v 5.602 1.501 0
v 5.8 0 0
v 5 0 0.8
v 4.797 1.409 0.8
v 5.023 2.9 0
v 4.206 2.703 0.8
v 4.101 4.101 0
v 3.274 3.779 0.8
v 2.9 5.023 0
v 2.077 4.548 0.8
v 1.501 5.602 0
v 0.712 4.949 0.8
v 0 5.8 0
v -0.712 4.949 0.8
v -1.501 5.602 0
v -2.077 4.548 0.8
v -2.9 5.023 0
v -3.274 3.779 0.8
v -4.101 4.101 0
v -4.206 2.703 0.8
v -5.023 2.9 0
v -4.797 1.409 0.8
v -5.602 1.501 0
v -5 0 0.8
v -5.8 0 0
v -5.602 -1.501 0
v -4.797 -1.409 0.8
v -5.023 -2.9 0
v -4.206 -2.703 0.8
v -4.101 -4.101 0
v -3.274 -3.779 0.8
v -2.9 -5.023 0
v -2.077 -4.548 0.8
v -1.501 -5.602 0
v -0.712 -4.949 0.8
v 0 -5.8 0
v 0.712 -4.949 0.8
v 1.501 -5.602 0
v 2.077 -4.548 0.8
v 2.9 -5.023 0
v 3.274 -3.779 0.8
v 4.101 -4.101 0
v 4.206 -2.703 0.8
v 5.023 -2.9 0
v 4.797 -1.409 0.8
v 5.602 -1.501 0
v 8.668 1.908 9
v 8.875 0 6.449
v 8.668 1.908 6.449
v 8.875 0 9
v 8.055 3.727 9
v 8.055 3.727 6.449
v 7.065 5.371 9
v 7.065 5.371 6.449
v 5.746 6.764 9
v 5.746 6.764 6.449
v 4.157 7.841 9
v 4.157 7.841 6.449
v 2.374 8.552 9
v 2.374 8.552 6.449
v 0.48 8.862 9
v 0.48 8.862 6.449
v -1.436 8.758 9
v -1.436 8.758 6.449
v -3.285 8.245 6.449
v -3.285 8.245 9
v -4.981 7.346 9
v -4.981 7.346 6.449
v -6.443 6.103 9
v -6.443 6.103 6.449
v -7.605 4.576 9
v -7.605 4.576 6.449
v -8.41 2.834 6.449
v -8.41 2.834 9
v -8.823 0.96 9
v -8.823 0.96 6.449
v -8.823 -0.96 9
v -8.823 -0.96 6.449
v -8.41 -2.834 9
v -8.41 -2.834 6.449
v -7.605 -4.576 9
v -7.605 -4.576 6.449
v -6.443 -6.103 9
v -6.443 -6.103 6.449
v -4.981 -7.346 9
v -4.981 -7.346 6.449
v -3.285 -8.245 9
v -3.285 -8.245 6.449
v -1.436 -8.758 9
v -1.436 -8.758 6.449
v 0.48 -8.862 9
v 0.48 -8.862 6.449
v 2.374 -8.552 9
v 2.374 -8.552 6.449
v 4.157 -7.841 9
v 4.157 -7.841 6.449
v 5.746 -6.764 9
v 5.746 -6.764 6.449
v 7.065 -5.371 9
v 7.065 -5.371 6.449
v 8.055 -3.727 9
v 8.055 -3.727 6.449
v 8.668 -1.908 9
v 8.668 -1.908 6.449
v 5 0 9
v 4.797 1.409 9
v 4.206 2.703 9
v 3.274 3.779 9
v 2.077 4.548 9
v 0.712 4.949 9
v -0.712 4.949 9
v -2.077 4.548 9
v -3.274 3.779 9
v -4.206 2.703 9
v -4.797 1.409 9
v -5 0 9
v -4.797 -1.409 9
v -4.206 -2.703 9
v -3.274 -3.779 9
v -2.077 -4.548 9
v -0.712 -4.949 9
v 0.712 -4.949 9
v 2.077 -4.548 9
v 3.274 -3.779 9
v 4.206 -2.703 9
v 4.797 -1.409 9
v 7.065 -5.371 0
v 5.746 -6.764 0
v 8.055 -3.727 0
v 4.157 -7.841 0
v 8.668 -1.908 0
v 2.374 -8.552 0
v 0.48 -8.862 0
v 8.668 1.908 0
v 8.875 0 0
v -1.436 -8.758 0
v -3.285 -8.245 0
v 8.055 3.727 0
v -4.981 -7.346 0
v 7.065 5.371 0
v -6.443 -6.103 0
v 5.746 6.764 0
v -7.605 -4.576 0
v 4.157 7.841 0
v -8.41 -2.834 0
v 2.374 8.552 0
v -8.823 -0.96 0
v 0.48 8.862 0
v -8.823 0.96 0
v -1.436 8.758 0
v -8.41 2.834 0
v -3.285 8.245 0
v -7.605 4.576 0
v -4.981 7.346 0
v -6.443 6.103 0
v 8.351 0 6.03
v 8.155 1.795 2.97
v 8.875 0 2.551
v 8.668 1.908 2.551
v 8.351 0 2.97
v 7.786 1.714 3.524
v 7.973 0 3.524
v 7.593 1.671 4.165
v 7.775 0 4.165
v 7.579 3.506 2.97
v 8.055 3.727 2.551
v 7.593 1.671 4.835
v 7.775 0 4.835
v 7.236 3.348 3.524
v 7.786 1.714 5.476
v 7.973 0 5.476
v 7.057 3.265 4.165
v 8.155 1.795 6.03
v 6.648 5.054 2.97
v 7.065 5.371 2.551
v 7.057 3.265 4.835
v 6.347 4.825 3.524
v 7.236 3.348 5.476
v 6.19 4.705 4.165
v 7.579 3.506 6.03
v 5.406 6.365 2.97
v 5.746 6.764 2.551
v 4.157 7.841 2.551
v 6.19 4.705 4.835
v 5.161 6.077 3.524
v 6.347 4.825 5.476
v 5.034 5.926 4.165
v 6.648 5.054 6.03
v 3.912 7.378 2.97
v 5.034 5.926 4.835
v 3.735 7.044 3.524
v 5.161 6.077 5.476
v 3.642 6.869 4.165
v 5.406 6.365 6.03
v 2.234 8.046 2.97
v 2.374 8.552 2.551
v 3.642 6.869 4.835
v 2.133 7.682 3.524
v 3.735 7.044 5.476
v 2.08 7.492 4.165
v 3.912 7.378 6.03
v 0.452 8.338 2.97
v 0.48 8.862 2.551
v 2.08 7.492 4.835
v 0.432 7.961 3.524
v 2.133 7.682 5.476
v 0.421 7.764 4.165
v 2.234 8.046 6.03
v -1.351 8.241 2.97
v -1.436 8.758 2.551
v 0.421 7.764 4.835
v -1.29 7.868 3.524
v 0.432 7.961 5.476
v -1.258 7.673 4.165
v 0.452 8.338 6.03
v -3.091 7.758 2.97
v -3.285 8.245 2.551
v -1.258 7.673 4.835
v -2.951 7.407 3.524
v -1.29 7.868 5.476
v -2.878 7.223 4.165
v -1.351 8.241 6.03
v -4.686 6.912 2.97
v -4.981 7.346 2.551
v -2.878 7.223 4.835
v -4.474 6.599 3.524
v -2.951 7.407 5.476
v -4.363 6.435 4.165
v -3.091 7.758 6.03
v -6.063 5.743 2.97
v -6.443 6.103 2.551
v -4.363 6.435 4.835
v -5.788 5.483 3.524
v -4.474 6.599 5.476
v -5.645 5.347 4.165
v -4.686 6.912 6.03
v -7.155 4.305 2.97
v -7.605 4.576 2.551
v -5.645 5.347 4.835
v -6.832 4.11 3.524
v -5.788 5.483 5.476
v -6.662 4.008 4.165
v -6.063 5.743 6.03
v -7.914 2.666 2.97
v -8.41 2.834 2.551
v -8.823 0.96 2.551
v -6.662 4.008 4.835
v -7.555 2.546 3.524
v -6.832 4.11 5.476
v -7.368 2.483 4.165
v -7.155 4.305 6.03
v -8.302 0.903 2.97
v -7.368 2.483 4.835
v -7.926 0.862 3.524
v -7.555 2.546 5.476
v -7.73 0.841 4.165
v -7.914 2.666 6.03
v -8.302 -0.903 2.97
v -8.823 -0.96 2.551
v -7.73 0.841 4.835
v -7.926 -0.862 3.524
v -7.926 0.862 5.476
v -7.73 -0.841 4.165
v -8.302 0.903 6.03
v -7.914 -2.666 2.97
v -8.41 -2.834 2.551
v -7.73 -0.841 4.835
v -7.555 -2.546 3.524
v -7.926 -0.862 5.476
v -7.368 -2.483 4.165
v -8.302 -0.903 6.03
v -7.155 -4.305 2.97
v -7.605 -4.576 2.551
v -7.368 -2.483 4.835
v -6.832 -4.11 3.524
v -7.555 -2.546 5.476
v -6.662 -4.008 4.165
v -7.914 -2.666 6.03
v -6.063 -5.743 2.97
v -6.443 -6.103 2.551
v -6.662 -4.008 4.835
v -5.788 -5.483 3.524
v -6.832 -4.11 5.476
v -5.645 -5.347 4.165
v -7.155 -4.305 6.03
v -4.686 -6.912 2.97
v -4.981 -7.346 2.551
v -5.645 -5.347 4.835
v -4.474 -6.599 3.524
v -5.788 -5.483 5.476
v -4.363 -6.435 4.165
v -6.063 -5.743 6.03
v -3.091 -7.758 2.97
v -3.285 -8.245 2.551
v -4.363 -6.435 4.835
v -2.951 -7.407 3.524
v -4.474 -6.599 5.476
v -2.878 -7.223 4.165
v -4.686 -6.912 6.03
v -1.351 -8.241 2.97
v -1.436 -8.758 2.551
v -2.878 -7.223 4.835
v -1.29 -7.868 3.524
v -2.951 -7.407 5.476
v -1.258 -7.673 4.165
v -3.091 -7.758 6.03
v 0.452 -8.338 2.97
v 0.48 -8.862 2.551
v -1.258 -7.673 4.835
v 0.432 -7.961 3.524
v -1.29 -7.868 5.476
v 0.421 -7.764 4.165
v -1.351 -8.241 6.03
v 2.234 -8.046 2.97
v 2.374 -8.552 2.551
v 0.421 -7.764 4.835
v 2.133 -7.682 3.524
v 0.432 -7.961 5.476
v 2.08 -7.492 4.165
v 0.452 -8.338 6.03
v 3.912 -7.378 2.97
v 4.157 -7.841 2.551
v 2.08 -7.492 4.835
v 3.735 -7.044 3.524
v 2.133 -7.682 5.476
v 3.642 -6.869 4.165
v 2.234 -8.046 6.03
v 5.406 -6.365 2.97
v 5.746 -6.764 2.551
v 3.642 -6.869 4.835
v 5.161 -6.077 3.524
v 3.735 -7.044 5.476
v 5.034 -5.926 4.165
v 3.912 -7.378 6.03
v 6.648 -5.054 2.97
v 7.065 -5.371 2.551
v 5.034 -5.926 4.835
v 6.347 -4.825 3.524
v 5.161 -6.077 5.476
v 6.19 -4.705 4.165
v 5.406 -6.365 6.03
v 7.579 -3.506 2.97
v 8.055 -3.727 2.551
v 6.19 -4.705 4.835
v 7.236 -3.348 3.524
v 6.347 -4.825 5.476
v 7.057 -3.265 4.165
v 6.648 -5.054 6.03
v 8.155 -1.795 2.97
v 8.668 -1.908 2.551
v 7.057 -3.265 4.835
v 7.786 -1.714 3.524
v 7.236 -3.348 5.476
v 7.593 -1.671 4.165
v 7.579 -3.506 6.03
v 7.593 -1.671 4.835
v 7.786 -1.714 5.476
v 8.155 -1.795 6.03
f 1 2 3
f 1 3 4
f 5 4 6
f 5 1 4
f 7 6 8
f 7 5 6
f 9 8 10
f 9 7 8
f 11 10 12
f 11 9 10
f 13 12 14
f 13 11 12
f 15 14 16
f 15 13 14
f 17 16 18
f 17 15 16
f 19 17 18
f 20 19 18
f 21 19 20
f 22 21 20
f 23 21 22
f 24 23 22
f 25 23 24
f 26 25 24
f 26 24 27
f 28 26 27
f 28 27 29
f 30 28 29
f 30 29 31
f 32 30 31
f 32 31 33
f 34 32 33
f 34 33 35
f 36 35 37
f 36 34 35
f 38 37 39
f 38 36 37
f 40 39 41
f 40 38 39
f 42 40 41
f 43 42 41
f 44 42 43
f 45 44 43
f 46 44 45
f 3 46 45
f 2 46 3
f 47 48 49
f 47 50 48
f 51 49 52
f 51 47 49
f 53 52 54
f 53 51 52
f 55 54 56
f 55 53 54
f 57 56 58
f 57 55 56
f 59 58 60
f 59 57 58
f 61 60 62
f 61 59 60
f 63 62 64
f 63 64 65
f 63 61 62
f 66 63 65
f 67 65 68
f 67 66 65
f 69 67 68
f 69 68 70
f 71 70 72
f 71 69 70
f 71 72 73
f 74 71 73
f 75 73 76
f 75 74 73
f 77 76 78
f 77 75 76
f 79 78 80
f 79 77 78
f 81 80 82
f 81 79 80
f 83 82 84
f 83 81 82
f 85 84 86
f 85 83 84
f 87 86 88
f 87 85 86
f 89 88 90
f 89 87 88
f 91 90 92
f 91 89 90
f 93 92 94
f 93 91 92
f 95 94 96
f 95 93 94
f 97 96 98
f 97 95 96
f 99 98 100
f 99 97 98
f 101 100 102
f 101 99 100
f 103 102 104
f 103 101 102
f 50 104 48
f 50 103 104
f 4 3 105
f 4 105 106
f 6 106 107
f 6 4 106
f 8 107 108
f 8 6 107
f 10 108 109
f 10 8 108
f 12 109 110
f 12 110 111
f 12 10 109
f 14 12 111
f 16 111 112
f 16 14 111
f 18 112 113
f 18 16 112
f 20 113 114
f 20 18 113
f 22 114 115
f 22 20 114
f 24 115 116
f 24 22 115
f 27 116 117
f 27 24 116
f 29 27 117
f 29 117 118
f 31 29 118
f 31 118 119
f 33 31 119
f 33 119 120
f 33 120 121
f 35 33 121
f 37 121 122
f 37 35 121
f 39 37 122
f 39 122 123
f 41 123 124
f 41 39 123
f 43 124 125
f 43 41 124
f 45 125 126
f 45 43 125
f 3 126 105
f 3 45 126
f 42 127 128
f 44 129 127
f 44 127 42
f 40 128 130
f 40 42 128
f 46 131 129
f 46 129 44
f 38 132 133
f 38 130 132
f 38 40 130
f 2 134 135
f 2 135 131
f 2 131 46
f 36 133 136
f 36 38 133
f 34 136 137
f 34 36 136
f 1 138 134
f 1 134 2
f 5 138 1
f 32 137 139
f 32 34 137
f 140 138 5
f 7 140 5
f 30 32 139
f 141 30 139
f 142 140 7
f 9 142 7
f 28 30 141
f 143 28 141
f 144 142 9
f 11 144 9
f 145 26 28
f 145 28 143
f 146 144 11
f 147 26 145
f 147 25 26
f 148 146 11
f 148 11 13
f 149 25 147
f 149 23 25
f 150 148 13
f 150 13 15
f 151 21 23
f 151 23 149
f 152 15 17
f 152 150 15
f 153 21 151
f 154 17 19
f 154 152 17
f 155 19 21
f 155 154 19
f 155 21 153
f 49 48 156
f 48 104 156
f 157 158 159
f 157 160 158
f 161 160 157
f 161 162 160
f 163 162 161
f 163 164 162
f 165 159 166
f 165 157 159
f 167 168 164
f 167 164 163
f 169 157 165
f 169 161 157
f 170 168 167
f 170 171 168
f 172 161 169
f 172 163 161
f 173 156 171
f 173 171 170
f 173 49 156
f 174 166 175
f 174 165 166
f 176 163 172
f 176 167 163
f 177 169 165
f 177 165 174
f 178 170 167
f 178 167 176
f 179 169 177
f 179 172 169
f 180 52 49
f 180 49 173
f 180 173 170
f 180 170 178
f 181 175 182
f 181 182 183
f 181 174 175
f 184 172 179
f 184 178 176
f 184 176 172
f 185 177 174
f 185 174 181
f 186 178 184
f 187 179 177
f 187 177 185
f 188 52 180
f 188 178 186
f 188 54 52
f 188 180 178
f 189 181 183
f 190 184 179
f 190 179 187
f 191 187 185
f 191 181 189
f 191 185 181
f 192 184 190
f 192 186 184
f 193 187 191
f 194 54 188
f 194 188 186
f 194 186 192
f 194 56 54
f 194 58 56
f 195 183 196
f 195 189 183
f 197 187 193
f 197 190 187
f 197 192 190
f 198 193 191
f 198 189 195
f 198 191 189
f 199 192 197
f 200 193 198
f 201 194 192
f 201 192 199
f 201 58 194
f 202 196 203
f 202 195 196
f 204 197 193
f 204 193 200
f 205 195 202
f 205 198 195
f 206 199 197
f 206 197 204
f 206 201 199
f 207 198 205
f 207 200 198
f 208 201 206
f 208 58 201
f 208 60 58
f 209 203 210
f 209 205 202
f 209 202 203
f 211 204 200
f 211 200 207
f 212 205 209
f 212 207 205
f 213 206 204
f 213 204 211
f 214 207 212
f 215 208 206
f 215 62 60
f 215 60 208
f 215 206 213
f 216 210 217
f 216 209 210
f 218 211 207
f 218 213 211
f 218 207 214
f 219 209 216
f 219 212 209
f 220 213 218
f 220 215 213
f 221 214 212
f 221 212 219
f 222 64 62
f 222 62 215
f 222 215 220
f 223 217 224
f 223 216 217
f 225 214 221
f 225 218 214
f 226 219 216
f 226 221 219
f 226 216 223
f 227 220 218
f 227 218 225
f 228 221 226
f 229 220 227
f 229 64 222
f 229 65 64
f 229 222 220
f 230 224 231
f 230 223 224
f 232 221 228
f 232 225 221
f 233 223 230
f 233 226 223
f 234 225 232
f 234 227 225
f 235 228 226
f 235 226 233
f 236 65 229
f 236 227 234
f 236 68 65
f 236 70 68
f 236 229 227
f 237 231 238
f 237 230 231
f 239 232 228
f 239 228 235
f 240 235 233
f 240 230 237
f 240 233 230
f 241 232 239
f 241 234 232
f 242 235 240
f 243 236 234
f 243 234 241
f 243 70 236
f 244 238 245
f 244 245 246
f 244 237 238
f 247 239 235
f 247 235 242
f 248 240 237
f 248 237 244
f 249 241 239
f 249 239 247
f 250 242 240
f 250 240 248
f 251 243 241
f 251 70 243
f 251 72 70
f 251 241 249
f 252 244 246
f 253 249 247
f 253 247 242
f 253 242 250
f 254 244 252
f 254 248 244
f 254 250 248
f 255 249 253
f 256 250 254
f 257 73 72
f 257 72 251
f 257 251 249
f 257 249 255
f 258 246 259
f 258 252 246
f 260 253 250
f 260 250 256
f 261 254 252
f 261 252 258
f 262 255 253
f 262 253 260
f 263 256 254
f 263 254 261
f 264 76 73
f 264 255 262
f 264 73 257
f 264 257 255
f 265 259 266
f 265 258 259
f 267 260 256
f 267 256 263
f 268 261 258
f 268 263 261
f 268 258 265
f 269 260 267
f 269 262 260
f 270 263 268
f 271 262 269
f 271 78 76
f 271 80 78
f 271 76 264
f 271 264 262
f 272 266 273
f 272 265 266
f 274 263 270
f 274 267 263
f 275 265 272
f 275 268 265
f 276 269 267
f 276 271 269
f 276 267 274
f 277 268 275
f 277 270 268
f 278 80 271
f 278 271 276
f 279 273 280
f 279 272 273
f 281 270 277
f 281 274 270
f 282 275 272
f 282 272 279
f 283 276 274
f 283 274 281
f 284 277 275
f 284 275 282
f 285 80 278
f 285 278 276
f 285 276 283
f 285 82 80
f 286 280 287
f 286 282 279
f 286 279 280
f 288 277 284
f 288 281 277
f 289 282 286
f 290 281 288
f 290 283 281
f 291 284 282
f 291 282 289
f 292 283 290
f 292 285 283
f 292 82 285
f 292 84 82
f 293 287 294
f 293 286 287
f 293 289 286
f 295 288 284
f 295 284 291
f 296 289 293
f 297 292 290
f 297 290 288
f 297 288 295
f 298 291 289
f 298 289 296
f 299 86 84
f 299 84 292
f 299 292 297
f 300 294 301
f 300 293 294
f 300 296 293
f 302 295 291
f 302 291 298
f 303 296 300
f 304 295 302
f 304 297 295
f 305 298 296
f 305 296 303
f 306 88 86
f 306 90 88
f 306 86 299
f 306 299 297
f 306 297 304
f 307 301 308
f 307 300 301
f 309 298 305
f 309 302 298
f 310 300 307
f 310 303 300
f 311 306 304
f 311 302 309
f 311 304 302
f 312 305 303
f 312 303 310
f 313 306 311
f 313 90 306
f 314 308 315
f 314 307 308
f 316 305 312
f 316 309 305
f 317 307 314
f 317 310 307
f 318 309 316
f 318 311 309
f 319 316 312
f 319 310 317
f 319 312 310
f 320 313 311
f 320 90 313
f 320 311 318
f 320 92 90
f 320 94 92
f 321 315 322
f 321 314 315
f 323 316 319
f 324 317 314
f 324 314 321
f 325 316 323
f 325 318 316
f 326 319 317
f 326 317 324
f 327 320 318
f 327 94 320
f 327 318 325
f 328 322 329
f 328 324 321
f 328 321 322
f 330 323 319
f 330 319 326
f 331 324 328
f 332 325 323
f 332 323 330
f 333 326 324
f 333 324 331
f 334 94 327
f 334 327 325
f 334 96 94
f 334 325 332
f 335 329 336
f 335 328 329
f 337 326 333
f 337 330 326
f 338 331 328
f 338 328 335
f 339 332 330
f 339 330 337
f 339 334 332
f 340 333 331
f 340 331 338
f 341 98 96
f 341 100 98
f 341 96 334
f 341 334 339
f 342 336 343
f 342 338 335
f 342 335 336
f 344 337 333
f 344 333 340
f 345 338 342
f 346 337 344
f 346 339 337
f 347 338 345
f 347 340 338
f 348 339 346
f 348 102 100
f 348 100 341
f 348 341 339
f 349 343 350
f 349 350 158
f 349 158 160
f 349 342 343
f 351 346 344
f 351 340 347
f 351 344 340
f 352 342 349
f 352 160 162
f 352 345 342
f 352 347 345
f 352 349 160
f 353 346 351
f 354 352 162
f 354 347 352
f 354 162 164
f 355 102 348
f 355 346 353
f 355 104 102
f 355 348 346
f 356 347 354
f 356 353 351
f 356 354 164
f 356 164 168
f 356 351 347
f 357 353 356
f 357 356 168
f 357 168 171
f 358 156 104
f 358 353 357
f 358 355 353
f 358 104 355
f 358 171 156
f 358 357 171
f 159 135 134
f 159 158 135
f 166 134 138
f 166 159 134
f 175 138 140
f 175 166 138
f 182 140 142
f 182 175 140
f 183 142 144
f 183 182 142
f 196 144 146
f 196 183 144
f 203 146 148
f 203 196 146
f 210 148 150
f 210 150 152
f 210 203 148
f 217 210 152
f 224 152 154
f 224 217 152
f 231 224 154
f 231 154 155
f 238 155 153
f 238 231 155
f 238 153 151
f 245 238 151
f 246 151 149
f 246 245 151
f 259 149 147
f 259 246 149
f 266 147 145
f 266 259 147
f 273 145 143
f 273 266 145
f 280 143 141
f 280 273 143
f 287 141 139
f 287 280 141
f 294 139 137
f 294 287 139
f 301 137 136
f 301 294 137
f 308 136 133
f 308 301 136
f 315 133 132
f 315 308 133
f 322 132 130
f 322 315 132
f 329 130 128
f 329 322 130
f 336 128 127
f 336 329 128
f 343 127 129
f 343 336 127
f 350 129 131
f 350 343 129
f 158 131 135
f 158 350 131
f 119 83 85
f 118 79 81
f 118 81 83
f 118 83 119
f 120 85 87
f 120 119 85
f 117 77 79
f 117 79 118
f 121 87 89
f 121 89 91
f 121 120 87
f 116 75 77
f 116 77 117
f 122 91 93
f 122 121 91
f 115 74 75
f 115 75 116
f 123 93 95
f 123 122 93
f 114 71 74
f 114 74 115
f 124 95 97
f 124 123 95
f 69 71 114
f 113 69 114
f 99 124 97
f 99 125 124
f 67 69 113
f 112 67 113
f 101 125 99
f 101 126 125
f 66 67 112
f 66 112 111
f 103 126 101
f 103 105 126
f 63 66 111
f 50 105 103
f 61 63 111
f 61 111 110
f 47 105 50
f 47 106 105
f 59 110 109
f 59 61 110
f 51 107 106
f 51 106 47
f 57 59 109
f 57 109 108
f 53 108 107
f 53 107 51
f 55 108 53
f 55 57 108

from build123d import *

# Parameters (mm, degrees)
F2_SIZE = 0.8


with BuildPart() as f1:
    # F0 (on Front) → F1 (revolve)
    with BuildSketch(Plane.XZ):
        with BuildLine():
            Line((5, 9), (5, 0))
            Line((5, 0), (8.875, 0))
            Line((8.875, 0), (8.875, 2.551443))
            ThreePointArc((8.875, 2.551443), (7.75, 4.5), (8.875, 6.448557))
            Line((8.875, 6.448557), (8.875, 9))
            Line((8.875, 9), (5, 9))
        make_face()
    revolve(axis=Axis((0, 0, 23.187623), (0, 0, 1)))

    # F2
    f2_edges = [f1.edges().sort_by_distance(p)[0] for p in [
        (-5, 0, 0),
    ]]
    chamfer(f2_edges, length=F2_SIZE)


solid = f1.part
